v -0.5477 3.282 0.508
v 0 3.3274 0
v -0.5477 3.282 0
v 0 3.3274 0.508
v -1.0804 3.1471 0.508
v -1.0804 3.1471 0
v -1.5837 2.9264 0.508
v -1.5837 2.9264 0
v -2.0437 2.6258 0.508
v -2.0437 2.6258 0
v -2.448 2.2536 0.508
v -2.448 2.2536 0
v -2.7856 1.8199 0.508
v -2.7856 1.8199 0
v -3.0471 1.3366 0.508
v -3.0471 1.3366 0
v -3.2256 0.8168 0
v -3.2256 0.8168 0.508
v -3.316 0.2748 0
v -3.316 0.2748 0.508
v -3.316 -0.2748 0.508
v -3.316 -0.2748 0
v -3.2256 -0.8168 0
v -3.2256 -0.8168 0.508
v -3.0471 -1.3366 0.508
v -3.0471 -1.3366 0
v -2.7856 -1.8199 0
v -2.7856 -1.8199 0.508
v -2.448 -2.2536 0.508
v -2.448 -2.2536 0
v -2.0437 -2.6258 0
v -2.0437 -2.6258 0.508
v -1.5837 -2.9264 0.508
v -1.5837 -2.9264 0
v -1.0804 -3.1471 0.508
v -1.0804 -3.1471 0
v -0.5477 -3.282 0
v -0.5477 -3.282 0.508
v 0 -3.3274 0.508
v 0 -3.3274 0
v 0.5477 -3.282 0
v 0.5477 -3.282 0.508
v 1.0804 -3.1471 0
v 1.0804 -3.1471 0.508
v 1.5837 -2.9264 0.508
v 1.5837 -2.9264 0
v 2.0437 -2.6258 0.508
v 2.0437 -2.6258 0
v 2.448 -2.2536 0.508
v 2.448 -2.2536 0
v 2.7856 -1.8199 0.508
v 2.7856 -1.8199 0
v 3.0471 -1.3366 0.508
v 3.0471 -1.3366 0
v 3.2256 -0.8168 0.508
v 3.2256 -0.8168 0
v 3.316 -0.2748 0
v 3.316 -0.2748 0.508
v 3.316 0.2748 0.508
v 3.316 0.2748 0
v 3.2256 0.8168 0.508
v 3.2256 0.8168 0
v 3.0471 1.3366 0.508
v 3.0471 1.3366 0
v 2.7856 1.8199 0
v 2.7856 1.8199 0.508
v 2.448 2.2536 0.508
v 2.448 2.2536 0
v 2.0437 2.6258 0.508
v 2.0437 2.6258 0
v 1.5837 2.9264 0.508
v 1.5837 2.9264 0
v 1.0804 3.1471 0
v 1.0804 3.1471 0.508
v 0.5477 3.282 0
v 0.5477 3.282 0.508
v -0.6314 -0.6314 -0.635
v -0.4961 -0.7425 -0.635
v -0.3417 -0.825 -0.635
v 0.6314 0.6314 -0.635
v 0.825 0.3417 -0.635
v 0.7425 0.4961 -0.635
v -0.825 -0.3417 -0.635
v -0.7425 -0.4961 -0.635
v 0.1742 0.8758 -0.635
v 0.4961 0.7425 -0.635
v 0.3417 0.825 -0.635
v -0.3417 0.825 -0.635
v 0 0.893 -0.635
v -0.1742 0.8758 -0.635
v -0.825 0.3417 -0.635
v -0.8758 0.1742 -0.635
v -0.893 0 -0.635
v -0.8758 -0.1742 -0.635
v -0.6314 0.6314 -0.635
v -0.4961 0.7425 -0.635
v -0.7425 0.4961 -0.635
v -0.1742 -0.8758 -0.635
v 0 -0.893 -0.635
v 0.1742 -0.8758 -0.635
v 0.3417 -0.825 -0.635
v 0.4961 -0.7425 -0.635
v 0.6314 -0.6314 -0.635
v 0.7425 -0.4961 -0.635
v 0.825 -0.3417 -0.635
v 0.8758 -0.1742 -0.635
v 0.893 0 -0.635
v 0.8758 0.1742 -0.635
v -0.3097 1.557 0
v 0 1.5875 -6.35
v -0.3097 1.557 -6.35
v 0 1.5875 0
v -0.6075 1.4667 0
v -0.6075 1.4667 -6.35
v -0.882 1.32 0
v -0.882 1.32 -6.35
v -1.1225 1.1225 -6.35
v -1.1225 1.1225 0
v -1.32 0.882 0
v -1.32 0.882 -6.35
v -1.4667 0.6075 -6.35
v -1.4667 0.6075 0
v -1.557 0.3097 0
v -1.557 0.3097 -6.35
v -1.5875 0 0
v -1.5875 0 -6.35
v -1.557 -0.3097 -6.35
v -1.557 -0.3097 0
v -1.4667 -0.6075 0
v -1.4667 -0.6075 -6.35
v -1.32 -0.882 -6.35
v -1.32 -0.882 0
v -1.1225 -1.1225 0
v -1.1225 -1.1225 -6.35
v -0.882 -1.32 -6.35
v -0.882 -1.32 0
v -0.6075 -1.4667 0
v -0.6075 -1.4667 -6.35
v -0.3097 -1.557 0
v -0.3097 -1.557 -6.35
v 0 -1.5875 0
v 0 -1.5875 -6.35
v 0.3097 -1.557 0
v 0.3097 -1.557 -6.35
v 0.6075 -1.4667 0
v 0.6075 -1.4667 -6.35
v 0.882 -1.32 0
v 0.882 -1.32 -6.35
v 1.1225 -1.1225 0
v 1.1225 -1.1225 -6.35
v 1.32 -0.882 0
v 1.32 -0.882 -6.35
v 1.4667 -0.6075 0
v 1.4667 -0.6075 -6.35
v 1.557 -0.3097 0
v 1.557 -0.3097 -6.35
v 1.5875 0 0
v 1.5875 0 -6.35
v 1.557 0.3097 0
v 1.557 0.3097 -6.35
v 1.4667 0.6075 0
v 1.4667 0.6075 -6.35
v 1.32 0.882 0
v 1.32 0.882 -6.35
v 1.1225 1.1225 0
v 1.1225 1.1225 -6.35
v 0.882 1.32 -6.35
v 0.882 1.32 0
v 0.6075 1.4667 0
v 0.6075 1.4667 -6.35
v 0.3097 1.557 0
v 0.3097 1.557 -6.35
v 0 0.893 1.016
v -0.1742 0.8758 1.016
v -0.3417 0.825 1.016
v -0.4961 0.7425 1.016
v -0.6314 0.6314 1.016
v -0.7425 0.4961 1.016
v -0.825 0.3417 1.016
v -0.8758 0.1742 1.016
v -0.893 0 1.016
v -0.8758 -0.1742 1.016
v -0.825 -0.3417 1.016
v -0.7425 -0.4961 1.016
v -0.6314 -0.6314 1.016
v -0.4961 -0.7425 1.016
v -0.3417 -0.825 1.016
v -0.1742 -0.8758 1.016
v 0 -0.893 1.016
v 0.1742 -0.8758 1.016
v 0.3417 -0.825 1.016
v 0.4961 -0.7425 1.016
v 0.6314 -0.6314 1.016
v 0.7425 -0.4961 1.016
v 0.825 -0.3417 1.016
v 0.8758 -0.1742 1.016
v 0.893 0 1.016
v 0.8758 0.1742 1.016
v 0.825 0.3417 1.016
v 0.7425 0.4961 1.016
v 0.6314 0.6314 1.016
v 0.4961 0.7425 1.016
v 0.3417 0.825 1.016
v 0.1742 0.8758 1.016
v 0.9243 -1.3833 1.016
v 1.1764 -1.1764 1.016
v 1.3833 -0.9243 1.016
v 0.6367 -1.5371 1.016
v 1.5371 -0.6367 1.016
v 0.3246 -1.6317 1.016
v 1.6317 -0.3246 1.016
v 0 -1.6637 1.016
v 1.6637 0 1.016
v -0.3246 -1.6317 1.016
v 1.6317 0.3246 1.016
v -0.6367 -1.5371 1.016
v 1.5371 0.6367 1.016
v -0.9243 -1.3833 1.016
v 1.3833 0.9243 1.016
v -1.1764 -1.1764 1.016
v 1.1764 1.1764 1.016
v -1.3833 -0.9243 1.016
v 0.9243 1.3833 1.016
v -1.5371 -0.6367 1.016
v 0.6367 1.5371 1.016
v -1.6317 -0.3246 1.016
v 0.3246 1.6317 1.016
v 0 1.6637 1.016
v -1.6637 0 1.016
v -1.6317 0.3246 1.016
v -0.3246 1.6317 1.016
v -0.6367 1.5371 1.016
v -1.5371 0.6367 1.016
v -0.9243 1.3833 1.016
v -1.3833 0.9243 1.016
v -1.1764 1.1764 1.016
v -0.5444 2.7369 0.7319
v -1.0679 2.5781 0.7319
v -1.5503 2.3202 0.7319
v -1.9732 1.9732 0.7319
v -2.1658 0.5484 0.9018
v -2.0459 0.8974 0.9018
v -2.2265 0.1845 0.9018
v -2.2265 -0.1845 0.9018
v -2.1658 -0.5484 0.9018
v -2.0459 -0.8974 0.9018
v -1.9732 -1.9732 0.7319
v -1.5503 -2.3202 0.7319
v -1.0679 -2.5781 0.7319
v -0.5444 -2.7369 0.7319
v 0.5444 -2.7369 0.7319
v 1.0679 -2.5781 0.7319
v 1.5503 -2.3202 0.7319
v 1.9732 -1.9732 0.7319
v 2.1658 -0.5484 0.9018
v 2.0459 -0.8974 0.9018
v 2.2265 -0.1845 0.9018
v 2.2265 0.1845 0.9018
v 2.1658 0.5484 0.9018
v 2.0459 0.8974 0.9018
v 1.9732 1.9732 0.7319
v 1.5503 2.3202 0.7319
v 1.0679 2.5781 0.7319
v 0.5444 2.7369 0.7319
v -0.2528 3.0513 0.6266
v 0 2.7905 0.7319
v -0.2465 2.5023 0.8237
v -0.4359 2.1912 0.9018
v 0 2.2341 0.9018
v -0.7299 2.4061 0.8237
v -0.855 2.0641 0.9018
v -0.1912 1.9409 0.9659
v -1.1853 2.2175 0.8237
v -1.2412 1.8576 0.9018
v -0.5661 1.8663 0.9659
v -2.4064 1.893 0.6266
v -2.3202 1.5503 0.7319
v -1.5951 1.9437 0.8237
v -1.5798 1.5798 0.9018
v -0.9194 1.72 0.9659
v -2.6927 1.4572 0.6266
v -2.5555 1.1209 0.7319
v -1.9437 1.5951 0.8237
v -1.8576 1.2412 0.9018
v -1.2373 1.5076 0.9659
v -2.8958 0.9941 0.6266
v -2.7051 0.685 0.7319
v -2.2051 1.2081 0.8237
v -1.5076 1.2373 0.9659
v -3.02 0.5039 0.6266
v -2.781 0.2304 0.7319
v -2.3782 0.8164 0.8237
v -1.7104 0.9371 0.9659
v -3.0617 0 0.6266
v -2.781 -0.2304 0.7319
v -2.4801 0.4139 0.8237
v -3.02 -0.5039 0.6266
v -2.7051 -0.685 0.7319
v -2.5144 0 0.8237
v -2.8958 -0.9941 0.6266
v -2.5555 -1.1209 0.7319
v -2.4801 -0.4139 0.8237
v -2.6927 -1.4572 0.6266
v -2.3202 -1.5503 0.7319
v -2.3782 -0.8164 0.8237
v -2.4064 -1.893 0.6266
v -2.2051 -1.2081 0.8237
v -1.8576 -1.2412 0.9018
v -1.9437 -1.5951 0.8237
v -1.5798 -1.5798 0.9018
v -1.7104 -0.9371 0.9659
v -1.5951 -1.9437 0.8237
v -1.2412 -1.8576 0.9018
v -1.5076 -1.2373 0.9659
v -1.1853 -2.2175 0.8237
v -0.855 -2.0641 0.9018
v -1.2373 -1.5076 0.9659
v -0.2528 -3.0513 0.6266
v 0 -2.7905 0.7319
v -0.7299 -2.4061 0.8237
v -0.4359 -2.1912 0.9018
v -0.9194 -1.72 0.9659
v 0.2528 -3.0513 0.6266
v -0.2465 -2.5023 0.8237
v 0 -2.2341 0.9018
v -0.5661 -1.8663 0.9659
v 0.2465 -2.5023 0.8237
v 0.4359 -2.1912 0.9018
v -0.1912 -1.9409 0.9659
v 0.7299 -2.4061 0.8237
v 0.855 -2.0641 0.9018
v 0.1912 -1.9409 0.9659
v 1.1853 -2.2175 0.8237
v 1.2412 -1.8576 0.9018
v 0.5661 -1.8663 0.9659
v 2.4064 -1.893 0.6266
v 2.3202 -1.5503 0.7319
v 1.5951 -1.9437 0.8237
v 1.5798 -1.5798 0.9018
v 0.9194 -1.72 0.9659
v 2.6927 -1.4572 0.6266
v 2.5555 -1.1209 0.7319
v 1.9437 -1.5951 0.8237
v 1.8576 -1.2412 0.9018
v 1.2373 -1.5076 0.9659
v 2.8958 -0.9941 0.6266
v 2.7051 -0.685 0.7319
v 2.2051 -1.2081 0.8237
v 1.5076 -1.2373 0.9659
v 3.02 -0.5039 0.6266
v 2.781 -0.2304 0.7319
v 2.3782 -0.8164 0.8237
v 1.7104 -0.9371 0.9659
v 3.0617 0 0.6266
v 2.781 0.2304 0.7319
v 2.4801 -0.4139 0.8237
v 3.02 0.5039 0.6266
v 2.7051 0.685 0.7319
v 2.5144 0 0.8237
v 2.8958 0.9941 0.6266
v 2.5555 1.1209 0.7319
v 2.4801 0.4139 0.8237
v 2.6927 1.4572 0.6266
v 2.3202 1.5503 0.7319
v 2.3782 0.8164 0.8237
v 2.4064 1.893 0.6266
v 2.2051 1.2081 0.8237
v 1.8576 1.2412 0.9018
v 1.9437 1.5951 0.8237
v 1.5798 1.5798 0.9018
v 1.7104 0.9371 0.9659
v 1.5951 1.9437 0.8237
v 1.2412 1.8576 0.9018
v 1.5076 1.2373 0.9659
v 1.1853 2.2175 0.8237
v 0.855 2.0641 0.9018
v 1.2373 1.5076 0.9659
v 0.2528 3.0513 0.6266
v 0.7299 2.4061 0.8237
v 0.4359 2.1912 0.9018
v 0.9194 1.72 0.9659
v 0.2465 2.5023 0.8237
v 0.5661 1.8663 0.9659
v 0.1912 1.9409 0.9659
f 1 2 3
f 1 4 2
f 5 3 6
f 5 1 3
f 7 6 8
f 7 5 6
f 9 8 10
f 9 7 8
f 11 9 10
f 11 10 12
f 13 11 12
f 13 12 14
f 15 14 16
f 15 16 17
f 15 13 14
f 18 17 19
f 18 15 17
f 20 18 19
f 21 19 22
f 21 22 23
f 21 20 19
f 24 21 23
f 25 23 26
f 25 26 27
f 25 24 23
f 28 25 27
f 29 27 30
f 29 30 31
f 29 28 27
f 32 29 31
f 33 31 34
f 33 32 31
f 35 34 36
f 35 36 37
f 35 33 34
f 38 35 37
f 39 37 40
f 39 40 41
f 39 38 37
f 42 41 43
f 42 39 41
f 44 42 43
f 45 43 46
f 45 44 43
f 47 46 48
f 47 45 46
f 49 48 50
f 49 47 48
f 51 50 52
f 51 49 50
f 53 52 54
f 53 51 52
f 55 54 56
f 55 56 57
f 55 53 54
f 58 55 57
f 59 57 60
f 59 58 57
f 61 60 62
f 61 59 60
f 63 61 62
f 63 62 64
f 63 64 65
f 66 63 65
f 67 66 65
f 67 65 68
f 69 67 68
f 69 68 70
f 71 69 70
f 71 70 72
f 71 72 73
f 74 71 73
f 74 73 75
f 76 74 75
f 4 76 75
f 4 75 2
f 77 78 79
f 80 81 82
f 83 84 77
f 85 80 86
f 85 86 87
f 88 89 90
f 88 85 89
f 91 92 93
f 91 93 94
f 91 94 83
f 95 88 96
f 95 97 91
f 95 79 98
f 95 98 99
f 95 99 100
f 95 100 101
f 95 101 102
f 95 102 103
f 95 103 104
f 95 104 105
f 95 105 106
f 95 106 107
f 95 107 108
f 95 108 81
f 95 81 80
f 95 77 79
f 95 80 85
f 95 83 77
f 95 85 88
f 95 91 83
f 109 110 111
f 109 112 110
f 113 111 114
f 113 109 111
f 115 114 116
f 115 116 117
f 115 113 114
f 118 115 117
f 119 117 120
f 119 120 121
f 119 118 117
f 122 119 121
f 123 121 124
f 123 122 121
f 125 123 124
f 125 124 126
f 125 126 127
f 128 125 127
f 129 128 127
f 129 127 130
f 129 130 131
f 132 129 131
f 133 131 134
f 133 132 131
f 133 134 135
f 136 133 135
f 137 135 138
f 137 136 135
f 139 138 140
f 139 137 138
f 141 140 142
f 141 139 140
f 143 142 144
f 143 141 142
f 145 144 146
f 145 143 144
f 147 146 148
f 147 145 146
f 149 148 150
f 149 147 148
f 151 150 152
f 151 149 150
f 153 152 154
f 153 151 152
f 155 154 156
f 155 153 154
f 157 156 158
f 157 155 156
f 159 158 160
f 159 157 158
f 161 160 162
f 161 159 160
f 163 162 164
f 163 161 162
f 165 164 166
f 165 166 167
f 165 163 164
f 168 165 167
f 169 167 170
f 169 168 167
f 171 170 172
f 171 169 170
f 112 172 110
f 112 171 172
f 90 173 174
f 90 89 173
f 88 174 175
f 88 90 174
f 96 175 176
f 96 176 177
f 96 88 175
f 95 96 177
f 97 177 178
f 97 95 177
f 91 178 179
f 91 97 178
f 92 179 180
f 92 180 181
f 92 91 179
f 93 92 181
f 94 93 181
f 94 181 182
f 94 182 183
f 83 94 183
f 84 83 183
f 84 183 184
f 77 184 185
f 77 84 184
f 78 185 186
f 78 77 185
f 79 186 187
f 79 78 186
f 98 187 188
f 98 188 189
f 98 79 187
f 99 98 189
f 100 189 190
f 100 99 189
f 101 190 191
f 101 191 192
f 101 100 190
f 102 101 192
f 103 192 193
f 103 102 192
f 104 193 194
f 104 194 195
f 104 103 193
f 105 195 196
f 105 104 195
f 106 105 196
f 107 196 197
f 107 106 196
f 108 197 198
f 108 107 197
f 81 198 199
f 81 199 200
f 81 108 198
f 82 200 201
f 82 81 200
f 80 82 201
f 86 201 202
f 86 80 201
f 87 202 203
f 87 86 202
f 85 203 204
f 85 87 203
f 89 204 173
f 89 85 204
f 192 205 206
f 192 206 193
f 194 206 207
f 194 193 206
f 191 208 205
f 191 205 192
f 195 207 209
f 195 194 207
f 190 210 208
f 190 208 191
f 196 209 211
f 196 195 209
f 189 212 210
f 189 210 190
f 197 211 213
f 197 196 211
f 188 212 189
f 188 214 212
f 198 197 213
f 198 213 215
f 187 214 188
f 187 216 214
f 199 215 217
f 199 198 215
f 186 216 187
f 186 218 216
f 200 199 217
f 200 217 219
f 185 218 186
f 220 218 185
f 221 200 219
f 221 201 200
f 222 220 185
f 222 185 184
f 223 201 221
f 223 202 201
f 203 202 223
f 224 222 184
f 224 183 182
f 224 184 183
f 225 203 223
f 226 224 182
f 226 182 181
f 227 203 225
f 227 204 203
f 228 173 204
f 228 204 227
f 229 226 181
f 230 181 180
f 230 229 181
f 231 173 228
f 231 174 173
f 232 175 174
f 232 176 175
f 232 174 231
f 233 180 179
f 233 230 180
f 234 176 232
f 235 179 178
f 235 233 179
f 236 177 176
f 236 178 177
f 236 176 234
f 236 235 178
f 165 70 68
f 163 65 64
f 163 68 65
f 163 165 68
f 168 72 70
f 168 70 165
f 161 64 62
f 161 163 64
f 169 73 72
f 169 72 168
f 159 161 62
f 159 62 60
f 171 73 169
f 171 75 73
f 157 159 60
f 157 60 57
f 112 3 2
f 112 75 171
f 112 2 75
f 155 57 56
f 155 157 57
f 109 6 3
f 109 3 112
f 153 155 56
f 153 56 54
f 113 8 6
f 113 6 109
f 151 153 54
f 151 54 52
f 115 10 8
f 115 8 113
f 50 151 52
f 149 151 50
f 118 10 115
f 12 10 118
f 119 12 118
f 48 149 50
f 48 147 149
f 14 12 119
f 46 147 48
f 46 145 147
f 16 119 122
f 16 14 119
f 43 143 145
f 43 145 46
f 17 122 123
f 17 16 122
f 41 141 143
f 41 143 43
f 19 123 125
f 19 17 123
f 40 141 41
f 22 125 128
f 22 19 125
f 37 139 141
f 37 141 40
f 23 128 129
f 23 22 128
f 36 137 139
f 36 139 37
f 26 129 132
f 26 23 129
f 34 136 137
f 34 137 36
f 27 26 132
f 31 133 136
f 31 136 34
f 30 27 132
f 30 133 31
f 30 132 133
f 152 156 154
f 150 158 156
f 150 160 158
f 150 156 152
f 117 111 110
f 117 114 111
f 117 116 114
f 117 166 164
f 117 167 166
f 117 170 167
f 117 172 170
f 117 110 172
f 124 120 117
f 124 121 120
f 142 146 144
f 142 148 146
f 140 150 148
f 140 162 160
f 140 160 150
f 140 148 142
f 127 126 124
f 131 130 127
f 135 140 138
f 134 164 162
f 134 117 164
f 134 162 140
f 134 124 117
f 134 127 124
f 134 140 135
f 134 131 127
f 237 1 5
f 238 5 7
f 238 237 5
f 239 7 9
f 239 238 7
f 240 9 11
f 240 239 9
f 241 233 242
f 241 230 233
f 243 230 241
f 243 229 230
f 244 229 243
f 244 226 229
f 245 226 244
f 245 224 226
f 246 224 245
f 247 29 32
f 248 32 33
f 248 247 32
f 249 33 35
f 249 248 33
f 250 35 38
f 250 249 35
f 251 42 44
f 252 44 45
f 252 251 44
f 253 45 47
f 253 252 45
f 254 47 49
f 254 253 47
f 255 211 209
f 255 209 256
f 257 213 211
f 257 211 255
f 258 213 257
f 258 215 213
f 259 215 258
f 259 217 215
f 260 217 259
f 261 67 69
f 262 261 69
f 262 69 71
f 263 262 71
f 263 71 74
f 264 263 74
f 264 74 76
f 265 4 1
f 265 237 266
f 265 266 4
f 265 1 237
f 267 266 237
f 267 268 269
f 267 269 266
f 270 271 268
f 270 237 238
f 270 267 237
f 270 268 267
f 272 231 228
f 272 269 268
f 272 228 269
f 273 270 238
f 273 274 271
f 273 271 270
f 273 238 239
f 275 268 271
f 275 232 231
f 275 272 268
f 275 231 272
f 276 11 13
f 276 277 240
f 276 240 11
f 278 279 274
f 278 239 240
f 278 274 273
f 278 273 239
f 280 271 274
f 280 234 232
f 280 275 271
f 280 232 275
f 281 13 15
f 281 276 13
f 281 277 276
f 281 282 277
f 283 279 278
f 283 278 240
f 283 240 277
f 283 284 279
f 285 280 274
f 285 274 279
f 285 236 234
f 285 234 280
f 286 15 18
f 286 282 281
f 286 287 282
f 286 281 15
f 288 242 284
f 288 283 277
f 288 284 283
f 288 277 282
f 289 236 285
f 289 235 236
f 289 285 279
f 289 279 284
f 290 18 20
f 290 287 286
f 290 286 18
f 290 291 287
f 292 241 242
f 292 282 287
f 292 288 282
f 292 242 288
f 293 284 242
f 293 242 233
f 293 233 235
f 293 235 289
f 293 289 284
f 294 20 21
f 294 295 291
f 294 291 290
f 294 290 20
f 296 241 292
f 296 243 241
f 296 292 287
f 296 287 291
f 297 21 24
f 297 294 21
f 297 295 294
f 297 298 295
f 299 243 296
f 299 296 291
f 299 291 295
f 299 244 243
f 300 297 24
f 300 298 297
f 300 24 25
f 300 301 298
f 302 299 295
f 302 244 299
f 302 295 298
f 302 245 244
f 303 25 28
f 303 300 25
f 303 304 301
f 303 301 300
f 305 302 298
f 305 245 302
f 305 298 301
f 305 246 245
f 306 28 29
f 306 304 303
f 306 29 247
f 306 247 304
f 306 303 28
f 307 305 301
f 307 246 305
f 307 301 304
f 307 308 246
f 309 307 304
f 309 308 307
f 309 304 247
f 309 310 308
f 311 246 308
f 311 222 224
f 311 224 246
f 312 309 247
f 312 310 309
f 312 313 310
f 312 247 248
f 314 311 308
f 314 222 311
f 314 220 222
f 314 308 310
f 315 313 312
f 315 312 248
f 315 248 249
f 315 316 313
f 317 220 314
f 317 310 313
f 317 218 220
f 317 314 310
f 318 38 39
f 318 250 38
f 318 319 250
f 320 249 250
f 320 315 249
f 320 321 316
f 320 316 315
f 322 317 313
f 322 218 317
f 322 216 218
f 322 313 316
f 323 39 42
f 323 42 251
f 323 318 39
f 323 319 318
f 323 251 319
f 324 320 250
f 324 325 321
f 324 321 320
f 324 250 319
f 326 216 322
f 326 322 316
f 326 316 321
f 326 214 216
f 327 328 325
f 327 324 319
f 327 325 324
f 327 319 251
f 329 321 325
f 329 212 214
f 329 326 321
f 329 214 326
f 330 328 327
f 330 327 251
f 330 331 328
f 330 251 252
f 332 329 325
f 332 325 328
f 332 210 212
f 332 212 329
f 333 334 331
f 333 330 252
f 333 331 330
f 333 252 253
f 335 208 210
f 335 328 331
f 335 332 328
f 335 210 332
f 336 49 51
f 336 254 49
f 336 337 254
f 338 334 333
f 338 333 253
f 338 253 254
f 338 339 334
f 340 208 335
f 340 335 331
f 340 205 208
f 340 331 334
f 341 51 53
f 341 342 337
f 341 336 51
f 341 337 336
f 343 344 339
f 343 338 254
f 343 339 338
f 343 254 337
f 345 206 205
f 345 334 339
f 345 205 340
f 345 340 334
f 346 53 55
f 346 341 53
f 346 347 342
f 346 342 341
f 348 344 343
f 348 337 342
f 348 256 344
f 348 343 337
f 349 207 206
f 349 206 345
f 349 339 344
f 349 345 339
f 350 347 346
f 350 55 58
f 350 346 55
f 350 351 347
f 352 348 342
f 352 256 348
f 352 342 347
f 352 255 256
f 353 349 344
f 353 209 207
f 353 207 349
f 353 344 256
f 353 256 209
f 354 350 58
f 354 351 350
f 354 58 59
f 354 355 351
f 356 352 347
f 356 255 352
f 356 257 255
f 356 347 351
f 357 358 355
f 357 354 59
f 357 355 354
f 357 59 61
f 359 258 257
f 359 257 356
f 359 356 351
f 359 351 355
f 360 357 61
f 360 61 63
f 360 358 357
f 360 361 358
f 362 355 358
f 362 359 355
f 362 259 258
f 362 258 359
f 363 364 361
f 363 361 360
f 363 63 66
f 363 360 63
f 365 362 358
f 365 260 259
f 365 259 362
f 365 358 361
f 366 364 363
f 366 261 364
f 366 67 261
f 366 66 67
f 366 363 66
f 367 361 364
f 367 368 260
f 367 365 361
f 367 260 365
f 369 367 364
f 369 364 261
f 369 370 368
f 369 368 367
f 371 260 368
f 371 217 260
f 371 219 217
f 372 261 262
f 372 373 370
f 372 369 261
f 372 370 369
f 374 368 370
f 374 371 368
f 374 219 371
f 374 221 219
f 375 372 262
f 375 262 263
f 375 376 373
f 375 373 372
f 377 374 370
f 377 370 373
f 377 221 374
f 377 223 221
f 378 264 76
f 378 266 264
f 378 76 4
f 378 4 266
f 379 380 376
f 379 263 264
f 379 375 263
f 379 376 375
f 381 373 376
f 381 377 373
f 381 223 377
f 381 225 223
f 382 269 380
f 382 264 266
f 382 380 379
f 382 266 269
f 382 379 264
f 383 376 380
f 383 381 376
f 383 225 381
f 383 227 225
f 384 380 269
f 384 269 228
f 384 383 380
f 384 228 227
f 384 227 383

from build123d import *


with BuildPart() as part:
    # Sketch2 → Revolve1 (revolve)
    with BuildSketch(Plane(origin=(0, 0, 0), x_dir=(0, 0, -1), z_dir=(1, 0, 0))):
        with BuildLine():
            Line((6.35, 1.5875), (0, 1.5875))
            Line((0, 1.5875), (0, 3.3274))
            Line((0, 3.3274), (-0.508, 3.3274))
            ThreePointArc((-0.508, 3.3274), (-0.823736431, 2.514400819), (-1.016, 1.6637))
            Line((-1.016, 1.6637), (-1.016, 0.89296875))
            Line((-1.016, 0.89296875), (0, 0.89296875))
            Line((0, 0.89296875), (0.635, 0.89296875))
            Line((0.635, 0.89296875), (0.635, 0))
            Line((0.635, 0), (6.35, 0))
            Line((6.35, 0), (6.35, 1.5875))
        make_face()
    revolve(axis=Axis((0, 0, -6.35), (0, 0, 1)))


solid = part.part
